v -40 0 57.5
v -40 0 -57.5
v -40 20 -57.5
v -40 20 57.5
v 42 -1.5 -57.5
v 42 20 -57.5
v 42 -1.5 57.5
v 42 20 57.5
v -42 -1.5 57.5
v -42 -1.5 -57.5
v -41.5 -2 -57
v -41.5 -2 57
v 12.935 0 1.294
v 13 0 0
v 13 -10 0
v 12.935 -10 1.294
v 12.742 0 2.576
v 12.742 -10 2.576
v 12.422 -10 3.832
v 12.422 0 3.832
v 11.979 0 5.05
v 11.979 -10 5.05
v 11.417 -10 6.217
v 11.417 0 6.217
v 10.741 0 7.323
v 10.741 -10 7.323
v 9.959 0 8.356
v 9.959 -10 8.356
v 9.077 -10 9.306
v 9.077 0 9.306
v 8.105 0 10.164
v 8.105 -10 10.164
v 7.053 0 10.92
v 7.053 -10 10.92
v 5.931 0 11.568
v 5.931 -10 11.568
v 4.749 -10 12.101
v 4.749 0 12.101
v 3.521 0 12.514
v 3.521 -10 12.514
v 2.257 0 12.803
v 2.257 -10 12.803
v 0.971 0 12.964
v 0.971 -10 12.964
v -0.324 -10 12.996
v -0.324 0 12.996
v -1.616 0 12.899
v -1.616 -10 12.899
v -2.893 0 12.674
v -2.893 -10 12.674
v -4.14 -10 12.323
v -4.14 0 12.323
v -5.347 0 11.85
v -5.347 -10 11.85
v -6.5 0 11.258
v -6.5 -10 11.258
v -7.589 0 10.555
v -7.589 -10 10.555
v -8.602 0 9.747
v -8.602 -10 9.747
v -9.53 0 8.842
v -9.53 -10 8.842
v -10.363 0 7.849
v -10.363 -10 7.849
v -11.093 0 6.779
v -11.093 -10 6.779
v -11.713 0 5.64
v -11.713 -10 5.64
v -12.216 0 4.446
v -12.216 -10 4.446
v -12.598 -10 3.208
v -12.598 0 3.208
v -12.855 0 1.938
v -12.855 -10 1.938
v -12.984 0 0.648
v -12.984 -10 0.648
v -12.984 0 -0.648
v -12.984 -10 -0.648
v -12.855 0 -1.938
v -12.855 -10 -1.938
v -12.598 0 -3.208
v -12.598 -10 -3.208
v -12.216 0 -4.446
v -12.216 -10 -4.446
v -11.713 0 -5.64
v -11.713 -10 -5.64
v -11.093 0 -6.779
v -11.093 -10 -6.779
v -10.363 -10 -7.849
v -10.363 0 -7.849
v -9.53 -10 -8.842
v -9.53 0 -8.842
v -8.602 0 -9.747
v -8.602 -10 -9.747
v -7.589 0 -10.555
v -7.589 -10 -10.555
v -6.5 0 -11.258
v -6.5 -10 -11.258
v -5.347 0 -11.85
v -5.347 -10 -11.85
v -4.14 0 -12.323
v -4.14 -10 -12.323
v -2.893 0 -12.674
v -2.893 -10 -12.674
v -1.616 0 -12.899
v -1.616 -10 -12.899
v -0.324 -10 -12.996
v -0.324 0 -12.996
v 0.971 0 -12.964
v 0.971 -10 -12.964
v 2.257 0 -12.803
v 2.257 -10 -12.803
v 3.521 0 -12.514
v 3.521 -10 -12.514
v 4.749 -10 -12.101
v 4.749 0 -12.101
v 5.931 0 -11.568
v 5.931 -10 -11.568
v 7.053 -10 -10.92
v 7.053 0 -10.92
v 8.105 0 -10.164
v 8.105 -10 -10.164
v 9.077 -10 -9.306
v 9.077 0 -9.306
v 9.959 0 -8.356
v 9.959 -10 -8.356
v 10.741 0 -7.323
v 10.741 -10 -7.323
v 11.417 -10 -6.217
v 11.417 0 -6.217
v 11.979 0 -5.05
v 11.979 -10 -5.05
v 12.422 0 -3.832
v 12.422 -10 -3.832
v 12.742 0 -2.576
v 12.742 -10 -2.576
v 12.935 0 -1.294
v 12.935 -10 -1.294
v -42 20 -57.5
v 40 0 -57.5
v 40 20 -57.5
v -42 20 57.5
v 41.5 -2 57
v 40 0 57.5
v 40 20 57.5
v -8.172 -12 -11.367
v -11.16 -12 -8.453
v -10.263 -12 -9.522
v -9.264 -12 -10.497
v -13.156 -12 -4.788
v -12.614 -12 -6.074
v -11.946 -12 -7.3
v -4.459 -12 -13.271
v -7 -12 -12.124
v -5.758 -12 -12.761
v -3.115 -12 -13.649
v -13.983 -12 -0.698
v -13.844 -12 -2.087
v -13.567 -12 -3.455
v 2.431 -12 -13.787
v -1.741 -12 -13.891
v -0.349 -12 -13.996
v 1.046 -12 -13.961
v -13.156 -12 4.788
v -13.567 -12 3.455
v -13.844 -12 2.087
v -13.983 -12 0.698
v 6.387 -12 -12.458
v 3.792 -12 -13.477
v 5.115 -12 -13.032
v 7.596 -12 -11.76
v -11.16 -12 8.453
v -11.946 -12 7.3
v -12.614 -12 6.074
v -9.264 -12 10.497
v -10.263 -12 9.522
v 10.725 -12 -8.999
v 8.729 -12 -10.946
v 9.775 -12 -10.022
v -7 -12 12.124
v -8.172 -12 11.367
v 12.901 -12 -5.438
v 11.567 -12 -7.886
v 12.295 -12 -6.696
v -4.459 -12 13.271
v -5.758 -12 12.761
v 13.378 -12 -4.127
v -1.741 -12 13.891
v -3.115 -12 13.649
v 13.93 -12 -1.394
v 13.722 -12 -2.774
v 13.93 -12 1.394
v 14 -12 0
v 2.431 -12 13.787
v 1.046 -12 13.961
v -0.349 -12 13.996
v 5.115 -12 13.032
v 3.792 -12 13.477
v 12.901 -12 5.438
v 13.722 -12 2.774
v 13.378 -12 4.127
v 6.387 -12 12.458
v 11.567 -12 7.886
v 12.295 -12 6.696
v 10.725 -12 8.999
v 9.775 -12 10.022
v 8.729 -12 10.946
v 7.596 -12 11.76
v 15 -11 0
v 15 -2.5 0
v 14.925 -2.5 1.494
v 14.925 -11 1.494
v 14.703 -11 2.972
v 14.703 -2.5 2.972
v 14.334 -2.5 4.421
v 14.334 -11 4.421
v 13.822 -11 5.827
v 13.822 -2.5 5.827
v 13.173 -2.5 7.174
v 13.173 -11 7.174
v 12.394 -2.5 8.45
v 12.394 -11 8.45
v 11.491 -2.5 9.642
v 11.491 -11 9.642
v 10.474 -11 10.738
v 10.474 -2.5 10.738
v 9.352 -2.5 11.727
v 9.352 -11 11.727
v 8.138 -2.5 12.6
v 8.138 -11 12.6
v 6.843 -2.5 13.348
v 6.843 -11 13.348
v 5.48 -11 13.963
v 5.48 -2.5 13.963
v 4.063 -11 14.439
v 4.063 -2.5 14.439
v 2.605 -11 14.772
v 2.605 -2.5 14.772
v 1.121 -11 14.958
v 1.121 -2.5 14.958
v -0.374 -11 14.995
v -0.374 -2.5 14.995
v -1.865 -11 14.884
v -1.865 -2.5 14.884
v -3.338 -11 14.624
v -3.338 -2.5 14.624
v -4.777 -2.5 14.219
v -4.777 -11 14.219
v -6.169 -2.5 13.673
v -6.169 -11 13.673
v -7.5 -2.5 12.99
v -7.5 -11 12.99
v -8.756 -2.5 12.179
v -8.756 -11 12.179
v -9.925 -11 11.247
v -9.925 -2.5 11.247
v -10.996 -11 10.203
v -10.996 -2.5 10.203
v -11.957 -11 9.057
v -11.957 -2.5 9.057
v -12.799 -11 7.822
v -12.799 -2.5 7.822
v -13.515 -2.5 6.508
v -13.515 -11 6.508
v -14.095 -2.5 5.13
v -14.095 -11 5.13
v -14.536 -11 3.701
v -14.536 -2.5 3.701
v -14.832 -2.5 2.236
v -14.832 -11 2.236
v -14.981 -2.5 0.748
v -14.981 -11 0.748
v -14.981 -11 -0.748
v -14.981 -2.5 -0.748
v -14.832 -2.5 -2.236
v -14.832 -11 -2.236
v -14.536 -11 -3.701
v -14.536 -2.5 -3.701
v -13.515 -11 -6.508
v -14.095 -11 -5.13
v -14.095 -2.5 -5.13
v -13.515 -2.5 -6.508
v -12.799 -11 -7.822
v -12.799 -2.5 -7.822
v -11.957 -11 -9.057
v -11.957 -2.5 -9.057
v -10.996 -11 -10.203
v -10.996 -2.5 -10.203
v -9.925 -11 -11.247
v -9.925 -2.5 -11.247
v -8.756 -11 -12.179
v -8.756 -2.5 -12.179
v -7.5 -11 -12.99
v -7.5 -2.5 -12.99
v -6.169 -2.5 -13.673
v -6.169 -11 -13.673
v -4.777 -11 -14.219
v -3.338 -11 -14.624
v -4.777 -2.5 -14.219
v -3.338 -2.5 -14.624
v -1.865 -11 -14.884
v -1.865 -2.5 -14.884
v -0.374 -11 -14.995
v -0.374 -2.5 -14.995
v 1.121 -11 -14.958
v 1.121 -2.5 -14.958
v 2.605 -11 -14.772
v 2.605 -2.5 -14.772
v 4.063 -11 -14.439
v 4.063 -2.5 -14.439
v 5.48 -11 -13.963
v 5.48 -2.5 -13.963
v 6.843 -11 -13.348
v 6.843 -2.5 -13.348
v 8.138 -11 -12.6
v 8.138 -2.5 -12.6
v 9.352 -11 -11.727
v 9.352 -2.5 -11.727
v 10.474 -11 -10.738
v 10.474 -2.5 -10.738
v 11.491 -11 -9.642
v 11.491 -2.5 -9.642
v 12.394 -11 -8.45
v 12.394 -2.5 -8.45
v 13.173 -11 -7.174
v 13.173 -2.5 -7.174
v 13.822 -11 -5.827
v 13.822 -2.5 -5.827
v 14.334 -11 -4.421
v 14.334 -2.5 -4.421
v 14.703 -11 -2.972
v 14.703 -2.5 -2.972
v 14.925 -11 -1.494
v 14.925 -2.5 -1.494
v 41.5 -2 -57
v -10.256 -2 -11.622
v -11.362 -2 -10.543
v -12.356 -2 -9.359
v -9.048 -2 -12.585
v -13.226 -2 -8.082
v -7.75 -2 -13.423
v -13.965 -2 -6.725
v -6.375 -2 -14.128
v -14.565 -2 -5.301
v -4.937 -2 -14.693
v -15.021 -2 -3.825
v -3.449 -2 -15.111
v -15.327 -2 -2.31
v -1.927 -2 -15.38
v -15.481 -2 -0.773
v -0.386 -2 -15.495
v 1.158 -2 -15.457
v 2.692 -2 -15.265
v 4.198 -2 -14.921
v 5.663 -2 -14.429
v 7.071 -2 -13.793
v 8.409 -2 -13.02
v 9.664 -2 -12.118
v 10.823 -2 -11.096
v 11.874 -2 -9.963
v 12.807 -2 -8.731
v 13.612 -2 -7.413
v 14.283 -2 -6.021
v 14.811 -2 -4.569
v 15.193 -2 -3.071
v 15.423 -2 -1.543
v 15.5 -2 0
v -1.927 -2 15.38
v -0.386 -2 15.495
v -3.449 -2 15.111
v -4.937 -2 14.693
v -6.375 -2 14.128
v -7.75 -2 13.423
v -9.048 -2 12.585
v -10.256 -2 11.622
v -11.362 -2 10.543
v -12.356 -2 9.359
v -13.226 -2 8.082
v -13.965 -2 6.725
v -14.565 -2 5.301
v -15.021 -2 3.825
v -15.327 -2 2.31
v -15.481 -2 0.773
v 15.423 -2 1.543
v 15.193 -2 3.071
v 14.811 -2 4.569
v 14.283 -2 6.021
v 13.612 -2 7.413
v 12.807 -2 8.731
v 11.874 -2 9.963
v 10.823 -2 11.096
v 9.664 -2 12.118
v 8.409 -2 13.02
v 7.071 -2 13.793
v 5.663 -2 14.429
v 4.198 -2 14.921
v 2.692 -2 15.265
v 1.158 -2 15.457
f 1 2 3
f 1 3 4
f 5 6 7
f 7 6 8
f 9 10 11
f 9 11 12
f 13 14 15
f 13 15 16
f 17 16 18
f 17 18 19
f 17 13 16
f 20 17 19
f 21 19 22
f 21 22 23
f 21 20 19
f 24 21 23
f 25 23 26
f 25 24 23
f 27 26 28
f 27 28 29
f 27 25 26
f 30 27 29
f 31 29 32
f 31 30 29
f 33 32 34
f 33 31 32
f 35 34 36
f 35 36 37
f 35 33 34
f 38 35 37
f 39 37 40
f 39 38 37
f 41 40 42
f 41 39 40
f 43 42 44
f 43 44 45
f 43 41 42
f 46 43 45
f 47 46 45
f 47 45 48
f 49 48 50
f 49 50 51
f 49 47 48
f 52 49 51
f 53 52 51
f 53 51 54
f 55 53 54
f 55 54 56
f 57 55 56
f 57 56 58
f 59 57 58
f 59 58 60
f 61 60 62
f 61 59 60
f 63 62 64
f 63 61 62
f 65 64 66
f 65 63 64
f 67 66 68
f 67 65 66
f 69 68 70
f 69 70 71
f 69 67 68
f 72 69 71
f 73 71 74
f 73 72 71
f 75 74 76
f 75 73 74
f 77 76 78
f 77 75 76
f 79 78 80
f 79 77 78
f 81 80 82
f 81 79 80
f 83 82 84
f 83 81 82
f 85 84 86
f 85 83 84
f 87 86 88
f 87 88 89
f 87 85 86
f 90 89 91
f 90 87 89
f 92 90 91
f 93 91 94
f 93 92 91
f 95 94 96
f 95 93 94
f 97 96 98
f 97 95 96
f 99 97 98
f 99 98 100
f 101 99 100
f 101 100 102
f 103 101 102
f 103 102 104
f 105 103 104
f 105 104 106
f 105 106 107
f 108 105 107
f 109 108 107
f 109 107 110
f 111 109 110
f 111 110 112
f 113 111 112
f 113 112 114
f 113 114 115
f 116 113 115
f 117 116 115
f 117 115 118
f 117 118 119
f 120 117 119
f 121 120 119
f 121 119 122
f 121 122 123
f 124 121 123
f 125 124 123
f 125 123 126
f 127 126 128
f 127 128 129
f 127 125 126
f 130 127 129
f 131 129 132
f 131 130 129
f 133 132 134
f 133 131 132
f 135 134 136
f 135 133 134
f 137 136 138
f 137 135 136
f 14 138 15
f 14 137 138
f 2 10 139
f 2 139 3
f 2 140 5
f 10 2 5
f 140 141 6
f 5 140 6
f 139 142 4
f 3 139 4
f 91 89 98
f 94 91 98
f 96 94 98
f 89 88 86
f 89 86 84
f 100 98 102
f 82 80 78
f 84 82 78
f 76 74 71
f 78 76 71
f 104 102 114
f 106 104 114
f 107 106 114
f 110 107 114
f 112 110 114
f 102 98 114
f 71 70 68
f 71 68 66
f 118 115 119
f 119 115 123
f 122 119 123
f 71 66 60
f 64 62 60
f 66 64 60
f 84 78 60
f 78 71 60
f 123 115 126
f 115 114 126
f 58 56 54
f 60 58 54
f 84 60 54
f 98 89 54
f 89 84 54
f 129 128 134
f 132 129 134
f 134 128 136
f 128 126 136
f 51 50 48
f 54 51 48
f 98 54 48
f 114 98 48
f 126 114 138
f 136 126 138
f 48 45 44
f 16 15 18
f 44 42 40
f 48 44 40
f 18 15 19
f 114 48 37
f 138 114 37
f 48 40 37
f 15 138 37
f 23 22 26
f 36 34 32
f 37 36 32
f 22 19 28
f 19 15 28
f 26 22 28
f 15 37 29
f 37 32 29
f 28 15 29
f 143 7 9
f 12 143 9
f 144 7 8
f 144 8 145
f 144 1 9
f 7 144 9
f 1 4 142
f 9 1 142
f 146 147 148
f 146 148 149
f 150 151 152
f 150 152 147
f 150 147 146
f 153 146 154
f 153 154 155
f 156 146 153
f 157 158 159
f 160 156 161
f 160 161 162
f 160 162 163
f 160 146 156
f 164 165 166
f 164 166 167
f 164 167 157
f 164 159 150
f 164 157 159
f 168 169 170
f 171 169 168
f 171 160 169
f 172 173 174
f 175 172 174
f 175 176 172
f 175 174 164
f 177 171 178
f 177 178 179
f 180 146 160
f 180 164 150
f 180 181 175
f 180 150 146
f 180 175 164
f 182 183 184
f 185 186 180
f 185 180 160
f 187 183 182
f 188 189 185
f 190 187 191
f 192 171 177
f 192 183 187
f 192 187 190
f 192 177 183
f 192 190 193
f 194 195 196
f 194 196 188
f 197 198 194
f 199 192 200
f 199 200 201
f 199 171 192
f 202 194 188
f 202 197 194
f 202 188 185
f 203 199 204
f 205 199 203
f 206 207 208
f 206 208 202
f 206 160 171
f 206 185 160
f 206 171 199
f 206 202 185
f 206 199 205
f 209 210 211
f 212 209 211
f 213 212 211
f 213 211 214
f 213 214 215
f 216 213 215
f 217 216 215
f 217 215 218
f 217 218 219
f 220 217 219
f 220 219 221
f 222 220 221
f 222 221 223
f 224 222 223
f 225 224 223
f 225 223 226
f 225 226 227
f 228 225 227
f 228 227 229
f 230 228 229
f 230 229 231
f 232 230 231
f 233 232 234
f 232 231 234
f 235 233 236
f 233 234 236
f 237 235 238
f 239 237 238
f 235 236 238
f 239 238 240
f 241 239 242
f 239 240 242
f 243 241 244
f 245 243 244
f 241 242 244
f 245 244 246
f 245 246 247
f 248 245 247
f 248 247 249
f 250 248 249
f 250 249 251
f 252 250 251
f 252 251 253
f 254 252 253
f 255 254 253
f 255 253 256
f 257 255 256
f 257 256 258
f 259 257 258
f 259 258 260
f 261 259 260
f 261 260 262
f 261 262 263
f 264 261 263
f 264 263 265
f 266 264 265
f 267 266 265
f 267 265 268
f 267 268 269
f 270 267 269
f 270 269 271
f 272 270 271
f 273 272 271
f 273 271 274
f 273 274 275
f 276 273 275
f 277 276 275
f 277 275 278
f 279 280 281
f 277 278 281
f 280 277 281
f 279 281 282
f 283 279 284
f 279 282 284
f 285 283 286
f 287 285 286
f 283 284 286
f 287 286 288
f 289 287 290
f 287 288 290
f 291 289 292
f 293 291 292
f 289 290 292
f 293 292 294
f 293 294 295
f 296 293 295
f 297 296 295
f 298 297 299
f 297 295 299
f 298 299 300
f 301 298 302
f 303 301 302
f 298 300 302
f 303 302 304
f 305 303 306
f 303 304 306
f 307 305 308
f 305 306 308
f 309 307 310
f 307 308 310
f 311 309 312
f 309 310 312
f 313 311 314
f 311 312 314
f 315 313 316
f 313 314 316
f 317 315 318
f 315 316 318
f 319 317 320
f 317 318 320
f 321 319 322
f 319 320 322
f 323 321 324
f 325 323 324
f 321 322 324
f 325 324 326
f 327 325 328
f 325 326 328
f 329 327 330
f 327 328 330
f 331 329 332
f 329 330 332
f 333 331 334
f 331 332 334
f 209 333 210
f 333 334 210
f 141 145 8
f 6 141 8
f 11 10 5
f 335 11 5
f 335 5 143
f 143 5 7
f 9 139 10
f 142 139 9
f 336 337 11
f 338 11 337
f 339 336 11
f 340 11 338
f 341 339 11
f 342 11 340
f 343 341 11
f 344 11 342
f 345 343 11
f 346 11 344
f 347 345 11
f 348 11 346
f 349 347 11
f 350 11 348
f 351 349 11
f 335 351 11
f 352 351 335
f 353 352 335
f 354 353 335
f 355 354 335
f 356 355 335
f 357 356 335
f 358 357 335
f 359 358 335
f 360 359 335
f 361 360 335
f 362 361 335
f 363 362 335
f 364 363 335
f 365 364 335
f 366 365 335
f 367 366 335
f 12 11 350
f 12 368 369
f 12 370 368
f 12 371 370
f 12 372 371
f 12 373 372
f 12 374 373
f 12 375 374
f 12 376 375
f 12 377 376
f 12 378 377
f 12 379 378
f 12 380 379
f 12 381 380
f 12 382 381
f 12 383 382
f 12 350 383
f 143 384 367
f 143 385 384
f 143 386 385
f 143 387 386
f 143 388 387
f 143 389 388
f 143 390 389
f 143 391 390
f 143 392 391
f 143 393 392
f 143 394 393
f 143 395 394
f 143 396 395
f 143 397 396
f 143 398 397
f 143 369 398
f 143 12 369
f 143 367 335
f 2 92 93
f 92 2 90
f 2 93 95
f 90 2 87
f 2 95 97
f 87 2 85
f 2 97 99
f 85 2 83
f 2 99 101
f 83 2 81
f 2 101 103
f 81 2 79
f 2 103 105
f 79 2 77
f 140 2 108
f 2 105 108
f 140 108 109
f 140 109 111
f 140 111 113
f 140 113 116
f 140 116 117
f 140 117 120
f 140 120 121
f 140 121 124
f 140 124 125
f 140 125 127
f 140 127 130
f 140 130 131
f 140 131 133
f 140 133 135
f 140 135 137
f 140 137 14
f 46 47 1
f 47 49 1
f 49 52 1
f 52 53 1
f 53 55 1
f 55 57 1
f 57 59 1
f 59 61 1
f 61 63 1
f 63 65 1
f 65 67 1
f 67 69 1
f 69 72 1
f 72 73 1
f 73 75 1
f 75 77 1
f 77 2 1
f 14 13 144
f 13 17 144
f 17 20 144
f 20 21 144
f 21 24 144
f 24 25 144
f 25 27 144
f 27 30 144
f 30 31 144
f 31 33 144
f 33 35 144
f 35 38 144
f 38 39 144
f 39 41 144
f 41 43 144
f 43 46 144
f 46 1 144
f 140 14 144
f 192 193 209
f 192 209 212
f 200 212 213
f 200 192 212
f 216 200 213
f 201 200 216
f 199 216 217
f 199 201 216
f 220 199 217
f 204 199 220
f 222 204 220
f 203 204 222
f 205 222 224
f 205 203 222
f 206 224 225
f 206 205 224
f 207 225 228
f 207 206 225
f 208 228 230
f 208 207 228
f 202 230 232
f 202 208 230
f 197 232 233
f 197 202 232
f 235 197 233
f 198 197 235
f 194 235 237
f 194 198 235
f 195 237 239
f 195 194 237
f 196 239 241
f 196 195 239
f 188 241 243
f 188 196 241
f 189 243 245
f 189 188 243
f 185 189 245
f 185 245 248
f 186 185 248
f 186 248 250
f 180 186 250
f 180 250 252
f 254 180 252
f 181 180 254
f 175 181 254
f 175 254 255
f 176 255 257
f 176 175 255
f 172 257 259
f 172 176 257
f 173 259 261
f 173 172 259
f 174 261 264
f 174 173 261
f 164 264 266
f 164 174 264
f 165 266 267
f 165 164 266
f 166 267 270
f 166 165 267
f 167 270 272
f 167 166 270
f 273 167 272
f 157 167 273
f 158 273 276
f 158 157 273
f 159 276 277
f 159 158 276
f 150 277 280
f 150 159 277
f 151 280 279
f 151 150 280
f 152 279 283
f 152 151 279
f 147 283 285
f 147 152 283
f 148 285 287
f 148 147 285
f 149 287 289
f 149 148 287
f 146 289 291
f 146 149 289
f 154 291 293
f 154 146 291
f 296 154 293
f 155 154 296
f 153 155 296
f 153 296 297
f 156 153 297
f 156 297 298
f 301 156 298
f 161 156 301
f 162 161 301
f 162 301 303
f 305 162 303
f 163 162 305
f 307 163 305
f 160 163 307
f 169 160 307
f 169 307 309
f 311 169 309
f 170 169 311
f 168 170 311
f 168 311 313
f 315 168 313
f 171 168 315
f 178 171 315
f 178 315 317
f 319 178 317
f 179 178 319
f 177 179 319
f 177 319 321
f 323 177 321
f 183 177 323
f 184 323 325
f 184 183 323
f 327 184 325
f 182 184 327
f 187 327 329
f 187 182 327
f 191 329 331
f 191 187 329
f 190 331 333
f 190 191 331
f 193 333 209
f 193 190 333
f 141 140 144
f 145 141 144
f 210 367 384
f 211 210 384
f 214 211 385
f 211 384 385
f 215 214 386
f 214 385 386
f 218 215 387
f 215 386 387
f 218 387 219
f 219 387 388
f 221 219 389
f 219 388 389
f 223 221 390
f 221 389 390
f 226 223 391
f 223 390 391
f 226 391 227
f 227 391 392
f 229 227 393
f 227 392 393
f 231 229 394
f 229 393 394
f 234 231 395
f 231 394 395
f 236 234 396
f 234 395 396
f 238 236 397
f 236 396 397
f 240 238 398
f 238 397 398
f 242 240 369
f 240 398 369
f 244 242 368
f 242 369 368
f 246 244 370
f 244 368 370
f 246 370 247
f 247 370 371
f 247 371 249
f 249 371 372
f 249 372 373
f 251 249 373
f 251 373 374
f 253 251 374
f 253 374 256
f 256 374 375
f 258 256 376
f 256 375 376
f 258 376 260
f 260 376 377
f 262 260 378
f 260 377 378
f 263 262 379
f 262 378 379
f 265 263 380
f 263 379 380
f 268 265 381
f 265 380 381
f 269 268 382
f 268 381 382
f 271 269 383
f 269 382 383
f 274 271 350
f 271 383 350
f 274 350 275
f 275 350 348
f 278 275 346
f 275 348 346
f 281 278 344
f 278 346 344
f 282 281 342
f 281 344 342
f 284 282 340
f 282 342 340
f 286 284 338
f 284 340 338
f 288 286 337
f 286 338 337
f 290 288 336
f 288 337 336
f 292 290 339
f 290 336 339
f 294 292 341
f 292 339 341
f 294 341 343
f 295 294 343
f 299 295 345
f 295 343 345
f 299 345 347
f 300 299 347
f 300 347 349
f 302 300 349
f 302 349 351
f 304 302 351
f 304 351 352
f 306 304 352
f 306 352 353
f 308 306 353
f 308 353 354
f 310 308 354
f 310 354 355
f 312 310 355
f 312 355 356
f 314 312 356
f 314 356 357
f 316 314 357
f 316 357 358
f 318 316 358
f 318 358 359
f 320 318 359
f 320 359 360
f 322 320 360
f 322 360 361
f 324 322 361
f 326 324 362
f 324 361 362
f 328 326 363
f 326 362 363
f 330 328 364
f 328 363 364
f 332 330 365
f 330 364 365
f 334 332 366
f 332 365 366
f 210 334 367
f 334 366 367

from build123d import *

# Parameters (mm, degrees)
F0_W     = 2
F0_H     = 115
F1_DEPTH = 20
F2_DEPTH = 20
F0_W_2   = 80
F0_R     = 15
F3_DEPTH = 2
F0_R_2   = 13
F4_DEPTH = 12
F5_DEPTH = 10
F6_SIZE  = 0.5
F7_SIZE  = 1


with BuildPart() as f1:
    # F0 (on Front) → F1 (new body)
    with BuildSketch(Plane.XZ):
        with Locations((-41, 0)):
            Rectangle(F0_W, F0_H)
    extrude(amount=-F1_DEPTH)



with BuildPart() as f2:
    # F0 (on Front) → F2 (new body)
    with BuildSketch(Plane.XZ):
        with Locations((41, 0)):
            Rectangle(F0_W, F0_H)
    extrude(amount=-F2_DEPTH)


with BuildPart() as f1_1:
    add(f1.part)

    add(f2.part)  # F3 merges F2
    # F0 (on Front) → F3 (join)
    with BuildSketch(Plane.XZ):
        Rectangle(F0_W_2, F0_H)
        Circle(F0_R, mode=Mode.SUBTRACT)
        with Locations((41, 0)):
            Rectangle(F0_W, F0_H)
        with Locations((-41, 0)):
            Rectangle(F0_W, F0_H)
    extrude(amount=F3_DEPTH)

    # F0 (on Front) → F4 (join)
    with BuildSketch(Plane.XZ):
        Circle(F0_R)
        Circle(F0_R_2, mode=Mode.SUBTRACT)
        Circle(F0_R_2)
    extrude(amount=F4_DEPTH)

    # F0 (on Front) → F5 (cut)
    with BuildSketch(Plane.XZ):
        Circle(F0_R_2)
    extrude(amount=F5_DEPTH, mode=Mode.SUBTRACT)

    # F6
    f6_edges = [f1_1.edges().sort_by_distance(p)[0] for p in [
        (42, -2, 0),
        (0, -2, 57.5),
        (-42, -2, 0),
        (0, -2, -57.5),
        (-15, -2, 0),
    ]]
    chamfer(f6_edges, length=F6_SIZE)

    # F7
    f7_edges = [f1_1.edges().sort_by_distance(p)[0] for p in [
        (-15, -12, 0),
    ]]
    chamfer(f7_edges, length=F7_SIZE)


solid = f1_1.part
